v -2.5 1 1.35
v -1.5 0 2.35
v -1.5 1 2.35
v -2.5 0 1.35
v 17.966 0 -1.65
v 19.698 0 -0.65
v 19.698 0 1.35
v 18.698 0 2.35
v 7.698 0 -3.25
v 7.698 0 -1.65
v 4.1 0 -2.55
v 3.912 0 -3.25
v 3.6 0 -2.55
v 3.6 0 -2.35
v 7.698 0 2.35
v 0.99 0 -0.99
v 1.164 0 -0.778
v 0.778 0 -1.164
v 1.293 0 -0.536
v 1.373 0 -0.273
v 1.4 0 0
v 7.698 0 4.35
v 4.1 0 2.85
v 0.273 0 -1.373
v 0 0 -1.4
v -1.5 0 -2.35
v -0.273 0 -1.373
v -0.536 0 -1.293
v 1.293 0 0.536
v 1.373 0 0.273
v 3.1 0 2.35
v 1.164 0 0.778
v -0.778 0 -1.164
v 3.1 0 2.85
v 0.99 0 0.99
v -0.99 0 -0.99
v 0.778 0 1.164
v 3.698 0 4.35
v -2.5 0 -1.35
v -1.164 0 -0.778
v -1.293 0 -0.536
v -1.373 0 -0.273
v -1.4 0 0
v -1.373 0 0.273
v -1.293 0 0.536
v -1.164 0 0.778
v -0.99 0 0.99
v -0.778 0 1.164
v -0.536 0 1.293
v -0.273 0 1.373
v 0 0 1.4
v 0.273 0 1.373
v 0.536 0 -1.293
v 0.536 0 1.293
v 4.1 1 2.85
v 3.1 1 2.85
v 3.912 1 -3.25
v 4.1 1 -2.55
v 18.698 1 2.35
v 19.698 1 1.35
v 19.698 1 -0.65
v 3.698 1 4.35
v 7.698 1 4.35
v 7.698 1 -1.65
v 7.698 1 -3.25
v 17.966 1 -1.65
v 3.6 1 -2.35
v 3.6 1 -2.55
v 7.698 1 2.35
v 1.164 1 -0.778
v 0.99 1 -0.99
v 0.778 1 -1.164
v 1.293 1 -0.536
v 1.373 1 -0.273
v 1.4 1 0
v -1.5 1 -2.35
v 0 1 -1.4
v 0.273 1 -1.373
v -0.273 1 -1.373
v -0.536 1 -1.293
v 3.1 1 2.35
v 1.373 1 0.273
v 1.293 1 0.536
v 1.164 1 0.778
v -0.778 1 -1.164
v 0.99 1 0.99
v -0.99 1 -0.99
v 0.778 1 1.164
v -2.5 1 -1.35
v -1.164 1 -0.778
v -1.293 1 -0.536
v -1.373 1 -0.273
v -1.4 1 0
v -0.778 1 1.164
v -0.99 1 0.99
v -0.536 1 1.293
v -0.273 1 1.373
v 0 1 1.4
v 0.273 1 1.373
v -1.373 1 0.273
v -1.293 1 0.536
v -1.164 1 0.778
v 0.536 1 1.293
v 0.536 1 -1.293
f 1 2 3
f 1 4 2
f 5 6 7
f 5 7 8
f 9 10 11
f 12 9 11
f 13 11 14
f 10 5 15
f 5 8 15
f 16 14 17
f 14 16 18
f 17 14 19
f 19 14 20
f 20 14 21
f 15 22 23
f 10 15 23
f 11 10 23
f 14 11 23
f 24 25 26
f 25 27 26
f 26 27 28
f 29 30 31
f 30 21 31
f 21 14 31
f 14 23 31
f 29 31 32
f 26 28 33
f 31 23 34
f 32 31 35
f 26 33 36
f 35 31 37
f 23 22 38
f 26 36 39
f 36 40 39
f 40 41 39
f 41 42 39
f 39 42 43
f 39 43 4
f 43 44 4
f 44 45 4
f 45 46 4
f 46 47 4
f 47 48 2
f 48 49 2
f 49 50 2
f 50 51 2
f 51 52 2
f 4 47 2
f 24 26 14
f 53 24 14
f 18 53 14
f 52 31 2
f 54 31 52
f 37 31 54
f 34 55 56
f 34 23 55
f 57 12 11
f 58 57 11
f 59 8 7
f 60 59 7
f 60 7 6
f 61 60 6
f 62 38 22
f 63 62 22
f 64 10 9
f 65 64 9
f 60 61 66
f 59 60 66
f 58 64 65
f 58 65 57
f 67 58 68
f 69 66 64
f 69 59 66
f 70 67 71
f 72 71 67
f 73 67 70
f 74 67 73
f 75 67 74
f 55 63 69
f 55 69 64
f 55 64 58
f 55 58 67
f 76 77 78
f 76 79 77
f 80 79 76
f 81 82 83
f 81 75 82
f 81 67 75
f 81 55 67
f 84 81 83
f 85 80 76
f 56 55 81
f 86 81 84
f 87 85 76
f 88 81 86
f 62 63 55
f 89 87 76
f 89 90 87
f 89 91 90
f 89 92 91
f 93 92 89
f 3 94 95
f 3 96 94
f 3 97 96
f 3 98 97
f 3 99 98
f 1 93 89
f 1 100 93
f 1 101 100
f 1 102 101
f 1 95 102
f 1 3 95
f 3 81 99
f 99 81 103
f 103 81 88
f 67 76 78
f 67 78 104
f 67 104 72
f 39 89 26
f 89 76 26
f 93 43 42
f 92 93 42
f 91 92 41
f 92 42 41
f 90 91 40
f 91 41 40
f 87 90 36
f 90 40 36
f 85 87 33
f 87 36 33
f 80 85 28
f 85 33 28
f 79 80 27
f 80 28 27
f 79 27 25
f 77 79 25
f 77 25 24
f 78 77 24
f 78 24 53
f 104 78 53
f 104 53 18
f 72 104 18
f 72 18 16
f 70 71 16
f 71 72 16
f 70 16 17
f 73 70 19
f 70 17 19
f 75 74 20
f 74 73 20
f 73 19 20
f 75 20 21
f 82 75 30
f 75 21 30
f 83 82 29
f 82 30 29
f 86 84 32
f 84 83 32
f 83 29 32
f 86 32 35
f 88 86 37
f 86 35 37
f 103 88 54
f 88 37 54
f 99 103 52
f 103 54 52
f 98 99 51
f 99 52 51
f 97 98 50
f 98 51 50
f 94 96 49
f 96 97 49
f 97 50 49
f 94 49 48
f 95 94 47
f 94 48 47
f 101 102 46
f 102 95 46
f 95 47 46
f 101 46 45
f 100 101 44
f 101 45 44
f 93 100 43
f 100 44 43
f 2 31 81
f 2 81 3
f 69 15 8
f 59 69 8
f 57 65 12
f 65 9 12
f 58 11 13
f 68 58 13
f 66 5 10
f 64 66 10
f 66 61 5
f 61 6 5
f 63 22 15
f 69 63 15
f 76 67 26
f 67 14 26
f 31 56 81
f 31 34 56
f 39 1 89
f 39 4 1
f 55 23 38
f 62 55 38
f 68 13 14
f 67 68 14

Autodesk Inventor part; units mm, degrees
ref_plane "YZ Plane" through (0, 0, 0) normal (1, 0, 0) x (0, 1, 0)
ref_plane "XZ Plane" through (0, 0, 0) normal (0, 1, 0) x (-1, 0, 0)
ref_plane "XY Plane" through (0, 0, 0) normal (0, 0, 1) x (1, 0, 0)
sketch "Sketch1" plane through (0, 0, 0) normal (0, 1, 0) x (-1, 0, 0)
  line L0 (-4.1, 2.85) -> (-3.1, 2.85)
  line L1 (-3.1, 2.85) -> (-3.1, 2.35)
  line L2 (-3.1, 2.35) -> (2.5, 2.35)
  line L3 (2.5, 2.35) -> (2.5, -2.35)
  line L4 (-4.1, 2.85) -> (-3.6981, 4.35)
  line L5 (-3.6981, 4.35) -> (-7.6981, 4.35)
  line L6 (-7.6981, 4.35) -> (-7.6981, 2.35)
  line L7 (-7.6981, 2.35) -> (-18.6981, 2.35)
  line L8 (-18.6981, 2.35) -> (-19.6981, 1.35)
  line L9 (-19.6981, 1.35) -> (-19.6981, -0.65)
  line L10 (-19.6981, -0.65) -> (-17.966, -1.65)
  line L11 (-17.966, -1.65) -> (-7.6981, -1.65)
  line L12 (-7.6981, -1.65) -> (-7.6981, -3.25)
  line L13 (-7.6981, -3.25) -> (-3.9124, -3.25)
  line L14 (-3.9124, -3.25) -> (-4.1, -2.55)
  line L15 (-4.1, -2.55) -> (-3.6, -2.55)
  line L16 (-3.6, -2.55) -> (-3.6, -2.35)
  line L17 (-3.6, -2.35) -> (2.5, -2.35)
  circle A0 centre (0, 0) radius 1.4
  dimension "d1" = 4
  dimension "d2" = 2
  dimension "d3" = 75
  dimension "d4" = 4.7
  dimension "d5" = 5.6
  dimension "d6" = 1
  dimension "d7" = 0.5
  dimension "d8" = 75
  dimension "d9" = 7.6
  dimension "d10" = 2
  dimension "d11" = 0.5
  dimension "d12" = 0.2
  dimension "d13" = 2.8
  dimension "d14" = 2.5
  dimension "d15" = 2.35
  dimension "d17" = 0
  dimension "d18" = 0
  dimension "d19" = 4
  dimension "d20" = 0
  dimension "d21" = 0
  dimension "d23" = 2
  dimension "d24" = 60
  dimension "d25" = 45
  dimension "d26" = 12
  dimension "d27" = 1
extrude "Plate1" add sketch "Sketch1" along normal blind 1
chamfer "Corner Chamfer1" distance 1 angle 45 2 edges at (-2.5, 0.5, 2.35) (-2.5, 0.5, -2.35)
sketch "Sketch2" plane through (0, 1, 0) normal (0, 1, 0) x (1, 0, 0)
  circle A0 centre (0, 0) radius 1.4 projected
equation "\"d8\" = d3"
equation "\"d15\" = 0.5 * d4"
equation "\"d31\" = Thickness"
equation "\"BendRadius\" = Thickness"
equation "\"BendReliefWidth\" = Thickness"
equation "\"BendReliefDepth\" = 0.5 * Thickness"
equation "\"CornerReliefSize\" = 4 * Thickness"
equation "\"MinimumRemnant\" = 2 * Thickness"
equation "\"TransitionRadius\" = BendRadius"
equation "\"JacobiRadiusSize\" = BendRadius"
equation "\"GapSize\" = Thickness"
equation "\"d16\" = BendRadius"
equation "\"Thickness\" = 1"
properties part number "PlacaFasePlug" material "Steel, Galvanized"
